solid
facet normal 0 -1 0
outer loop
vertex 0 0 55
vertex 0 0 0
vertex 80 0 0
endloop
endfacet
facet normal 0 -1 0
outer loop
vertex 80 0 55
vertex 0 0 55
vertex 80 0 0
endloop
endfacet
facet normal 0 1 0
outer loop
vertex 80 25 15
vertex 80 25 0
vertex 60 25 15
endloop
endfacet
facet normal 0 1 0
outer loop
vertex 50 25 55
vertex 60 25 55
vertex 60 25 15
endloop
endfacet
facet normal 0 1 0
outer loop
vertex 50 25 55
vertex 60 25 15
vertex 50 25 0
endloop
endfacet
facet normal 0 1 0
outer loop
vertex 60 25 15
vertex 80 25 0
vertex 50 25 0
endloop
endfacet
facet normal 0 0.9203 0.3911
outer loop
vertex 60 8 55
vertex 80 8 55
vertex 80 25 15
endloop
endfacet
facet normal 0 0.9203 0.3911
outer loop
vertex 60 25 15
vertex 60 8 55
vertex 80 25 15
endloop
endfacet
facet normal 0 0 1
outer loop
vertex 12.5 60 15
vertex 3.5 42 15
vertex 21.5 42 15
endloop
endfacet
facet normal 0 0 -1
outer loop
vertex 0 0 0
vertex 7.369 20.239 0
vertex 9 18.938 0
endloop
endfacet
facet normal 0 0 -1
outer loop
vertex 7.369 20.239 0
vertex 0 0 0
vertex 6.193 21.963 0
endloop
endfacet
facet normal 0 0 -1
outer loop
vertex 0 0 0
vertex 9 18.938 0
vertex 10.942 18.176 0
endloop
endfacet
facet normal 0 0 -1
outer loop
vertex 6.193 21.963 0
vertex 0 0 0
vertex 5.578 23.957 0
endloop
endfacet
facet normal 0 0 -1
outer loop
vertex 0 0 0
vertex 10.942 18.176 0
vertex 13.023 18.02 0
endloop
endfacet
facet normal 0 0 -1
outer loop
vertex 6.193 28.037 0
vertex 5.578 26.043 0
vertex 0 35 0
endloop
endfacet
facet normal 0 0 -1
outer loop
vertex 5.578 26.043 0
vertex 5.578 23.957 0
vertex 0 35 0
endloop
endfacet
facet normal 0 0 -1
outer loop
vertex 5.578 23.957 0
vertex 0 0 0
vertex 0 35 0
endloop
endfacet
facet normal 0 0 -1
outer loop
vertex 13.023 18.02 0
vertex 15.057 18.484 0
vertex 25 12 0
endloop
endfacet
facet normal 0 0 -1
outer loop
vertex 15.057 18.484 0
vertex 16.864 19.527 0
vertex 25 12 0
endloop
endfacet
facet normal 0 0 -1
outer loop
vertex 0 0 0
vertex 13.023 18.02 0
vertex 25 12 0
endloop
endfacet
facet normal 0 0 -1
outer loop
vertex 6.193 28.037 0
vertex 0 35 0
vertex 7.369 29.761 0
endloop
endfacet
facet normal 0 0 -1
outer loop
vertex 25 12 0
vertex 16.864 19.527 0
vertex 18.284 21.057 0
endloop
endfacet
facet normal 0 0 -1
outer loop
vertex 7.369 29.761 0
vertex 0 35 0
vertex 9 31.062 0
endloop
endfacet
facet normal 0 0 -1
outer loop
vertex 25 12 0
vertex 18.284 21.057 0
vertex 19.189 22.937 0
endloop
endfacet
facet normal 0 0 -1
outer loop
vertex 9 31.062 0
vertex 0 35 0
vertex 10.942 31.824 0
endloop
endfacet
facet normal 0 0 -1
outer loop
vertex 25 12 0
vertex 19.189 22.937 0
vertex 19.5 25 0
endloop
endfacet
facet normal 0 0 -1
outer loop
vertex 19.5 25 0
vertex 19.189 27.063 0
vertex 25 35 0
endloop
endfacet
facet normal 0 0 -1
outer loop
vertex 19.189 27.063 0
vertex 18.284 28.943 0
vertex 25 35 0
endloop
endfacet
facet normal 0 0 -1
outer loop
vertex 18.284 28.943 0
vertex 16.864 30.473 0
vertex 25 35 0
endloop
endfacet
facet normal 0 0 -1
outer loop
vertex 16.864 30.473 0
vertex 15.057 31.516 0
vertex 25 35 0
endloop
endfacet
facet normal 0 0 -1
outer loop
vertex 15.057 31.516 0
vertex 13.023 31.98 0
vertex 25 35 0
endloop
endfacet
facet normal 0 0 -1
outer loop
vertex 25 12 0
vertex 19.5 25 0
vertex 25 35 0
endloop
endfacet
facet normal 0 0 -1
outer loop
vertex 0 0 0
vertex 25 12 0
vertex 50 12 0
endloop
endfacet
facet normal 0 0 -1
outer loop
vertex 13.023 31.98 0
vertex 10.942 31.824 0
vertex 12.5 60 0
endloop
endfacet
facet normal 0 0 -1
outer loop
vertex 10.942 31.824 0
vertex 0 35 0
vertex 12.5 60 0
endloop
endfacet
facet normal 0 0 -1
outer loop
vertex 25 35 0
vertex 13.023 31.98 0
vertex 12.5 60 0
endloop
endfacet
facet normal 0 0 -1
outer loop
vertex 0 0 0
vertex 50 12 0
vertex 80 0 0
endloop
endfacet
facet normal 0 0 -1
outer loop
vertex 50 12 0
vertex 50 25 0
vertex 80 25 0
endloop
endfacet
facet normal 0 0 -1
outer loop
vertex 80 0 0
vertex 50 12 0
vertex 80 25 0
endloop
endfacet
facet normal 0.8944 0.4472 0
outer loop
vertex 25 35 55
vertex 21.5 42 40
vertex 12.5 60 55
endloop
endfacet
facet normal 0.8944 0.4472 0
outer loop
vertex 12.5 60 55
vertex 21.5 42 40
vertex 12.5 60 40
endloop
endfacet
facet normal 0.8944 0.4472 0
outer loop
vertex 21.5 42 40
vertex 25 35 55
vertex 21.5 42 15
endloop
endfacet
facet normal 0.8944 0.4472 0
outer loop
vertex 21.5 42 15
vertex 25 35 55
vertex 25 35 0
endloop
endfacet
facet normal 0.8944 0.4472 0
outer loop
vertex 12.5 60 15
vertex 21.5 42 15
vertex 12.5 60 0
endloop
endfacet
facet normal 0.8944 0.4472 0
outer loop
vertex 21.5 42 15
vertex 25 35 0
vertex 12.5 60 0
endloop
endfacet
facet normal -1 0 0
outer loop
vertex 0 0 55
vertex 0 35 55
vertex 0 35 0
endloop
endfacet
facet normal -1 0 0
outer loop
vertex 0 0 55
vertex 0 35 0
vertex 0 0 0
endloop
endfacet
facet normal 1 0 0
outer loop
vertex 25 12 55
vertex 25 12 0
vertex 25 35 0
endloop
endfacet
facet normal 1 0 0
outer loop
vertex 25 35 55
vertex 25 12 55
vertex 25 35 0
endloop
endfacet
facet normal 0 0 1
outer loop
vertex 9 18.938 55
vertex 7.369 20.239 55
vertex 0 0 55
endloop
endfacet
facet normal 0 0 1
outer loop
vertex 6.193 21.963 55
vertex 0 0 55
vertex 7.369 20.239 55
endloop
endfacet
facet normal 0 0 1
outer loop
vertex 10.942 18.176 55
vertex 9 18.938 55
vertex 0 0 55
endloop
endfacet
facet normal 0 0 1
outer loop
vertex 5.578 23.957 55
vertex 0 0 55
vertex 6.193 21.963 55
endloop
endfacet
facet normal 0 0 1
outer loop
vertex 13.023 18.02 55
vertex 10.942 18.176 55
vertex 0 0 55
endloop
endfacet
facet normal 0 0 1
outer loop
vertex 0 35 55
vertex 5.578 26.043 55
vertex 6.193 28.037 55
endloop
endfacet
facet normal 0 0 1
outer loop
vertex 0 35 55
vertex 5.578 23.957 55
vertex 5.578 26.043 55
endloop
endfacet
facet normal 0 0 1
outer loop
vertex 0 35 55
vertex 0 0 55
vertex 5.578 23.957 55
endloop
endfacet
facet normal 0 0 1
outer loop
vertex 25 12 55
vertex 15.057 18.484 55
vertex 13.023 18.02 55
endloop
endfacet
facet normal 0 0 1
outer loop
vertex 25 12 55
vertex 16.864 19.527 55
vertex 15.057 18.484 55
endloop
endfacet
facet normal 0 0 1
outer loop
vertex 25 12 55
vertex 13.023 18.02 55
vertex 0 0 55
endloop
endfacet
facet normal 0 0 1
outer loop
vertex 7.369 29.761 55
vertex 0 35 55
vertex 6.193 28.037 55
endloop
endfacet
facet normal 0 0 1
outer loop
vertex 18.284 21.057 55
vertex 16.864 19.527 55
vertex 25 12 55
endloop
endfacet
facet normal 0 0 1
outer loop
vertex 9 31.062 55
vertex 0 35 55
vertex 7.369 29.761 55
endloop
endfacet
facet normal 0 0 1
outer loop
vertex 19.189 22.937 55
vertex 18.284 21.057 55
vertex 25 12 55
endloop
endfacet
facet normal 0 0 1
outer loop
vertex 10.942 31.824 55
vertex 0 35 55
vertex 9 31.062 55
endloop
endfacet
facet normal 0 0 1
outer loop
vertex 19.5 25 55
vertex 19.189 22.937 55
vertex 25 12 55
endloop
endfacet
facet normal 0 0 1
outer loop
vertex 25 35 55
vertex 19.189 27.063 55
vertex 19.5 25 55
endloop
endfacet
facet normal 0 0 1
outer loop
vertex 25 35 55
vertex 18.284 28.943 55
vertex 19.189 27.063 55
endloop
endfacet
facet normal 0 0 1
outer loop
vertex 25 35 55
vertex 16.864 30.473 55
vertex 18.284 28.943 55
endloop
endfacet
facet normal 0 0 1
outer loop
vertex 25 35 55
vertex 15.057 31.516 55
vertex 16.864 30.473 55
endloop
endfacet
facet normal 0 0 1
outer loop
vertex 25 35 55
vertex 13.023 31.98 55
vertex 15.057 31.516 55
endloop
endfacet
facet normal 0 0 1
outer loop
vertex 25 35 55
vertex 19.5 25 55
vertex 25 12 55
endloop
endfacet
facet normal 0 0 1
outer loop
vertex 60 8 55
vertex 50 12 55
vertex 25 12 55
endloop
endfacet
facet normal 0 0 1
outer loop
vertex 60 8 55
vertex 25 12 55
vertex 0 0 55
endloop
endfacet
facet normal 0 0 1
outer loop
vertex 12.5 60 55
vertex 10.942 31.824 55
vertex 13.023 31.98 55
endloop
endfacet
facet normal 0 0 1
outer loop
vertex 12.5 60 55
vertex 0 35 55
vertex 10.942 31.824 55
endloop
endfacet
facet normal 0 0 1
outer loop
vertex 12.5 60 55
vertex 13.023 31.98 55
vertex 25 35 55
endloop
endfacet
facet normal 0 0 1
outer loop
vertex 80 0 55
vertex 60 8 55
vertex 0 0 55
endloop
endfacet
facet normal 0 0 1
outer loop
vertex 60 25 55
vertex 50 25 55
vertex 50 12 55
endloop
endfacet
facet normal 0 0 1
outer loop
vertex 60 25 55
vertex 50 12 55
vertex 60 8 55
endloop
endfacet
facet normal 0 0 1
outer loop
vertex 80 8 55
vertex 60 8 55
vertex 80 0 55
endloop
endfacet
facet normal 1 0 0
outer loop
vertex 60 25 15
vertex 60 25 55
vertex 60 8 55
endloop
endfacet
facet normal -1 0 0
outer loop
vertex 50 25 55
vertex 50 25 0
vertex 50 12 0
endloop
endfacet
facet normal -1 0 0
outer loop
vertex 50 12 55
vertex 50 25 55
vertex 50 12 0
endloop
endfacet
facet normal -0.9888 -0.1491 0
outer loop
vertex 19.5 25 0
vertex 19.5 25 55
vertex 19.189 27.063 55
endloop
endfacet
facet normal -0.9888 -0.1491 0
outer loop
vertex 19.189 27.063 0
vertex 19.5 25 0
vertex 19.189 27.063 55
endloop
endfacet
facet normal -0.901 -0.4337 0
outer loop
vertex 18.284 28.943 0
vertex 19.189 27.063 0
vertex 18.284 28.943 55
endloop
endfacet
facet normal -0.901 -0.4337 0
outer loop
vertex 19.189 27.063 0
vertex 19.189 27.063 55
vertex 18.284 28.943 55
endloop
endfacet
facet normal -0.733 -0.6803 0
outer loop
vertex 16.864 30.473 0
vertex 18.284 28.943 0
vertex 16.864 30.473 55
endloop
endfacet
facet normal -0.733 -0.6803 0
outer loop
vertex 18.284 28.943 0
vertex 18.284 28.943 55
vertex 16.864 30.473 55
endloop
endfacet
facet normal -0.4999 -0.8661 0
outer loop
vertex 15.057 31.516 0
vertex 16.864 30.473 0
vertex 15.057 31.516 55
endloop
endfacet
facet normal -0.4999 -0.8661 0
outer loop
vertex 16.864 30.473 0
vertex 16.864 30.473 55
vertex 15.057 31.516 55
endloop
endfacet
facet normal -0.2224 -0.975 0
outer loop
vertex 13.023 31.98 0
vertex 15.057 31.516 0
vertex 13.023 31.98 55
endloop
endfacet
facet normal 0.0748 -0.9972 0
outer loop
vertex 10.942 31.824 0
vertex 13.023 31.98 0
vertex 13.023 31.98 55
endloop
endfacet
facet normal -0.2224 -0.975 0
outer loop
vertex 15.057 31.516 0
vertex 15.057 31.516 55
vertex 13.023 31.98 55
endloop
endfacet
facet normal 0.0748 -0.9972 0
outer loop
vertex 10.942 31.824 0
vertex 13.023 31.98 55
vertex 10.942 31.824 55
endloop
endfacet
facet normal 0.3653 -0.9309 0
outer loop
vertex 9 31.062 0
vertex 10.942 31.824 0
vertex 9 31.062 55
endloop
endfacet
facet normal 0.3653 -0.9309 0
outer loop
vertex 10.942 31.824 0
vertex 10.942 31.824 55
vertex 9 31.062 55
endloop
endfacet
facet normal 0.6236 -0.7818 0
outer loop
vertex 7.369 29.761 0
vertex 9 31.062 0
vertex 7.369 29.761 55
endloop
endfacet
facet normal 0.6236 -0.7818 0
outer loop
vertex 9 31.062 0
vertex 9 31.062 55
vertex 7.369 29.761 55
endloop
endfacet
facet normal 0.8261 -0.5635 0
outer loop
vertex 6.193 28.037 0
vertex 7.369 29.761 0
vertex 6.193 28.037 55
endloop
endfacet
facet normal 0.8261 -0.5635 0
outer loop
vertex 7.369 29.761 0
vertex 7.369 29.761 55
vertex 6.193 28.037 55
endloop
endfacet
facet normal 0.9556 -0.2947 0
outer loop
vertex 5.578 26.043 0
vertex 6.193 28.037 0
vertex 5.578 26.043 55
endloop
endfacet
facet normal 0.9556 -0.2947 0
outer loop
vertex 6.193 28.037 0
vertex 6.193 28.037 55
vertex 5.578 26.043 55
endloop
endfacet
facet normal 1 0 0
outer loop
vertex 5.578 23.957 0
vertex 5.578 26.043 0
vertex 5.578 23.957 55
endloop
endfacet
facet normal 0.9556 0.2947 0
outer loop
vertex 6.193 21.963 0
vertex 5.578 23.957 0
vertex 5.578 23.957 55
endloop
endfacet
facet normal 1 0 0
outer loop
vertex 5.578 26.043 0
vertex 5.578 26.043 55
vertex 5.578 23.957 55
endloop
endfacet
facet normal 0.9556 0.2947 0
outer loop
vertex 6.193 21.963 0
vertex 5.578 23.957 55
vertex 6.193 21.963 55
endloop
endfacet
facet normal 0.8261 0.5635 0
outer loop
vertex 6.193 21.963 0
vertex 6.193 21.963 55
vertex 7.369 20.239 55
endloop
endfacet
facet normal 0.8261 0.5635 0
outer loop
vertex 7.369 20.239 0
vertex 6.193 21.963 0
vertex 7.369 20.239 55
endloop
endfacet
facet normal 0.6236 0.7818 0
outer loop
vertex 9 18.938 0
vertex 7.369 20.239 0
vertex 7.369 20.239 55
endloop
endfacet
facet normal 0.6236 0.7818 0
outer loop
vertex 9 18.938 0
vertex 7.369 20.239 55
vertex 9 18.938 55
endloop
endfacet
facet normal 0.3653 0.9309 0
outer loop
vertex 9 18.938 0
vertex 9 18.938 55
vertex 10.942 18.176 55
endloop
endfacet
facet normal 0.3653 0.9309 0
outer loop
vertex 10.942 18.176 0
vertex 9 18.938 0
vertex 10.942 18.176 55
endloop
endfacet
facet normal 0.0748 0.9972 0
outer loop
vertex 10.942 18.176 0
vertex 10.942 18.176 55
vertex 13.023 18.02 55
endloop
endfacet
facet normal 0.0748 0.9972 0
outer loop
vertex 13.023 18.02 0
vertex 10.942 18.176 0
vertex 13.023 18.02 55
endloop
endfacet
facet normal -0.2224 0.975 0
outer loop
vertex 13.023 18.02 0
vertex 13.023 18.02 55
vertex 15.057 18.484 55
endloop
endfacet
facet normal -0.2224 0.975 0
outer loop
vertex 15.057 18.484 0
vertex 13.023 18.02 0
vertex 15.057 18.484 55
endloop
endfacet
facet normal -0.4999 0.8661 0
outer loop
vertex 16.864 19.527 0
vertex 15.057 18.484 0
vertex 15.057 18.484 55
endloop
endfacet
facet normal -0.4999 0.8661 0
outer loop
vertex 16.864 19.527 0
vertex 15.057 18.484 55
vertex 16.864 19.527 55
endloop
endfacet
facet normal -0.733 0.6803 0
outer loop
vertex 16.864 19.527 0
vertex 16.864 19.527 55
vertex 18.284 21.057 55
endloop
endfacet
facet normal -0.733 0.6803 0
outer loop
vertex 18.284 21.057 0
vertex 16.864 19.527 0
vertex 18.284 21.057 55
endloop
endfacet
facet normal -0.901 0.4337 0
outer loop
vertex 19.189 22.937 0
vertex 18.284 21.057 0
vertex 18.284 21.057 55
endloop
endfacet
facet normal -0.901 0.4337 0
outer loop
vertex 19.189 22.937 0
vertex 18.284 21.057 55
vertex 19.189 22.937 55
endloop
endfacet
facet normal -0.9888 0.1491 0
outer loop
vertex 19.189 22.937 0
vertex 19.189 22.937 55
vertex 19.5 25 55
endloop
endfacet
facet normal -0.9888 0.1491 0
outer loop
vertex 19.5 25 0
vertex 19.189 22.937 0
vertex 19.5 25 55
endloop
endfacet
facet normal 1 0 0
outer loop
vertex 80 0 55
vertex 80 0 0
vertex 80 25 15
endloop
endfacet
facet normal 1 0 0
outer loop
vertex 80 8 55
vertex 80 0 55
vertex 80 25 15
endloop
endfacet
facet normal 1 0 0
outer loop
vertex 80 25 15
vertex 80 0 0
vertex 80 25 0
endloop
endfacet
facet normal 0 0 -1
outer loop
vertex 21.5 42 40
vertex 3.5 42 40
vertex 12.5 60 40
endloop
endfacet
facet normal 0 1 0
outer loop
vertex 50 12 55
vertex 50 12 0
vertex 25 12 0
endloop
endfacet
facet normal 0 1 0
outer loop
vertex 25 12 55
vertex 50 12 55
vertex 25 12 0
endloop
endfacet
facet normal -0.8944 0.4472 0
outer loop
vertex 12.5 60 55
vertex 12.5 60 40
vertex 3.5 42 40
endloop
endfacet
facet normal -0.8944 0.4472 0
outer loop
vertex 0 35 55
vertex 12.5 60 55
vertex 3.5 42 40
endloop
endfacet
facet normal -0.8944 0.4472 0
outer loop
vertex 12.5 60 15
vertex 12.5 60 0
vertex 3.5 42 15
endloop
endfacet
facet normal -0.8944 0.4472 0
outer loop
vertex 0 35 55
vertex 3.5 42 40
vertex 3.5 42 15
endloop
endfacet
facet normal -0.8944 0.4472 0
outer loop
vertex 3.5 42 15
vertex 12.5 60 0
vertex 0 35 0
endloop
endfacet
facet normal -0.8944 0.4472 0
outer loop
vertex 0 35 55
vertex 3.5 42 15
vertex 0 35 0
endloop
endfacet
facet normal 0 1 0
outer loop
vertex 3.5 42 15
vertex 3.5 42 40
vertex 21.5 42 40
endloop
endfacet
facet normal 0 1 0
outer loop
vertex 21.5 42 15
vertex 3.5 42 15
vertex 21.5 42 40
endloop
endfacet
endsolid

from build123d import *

# Parameters (mm, degrees)
BOSS_EXTRUDE2_DEPTH = 55
SKETCH8_R           = 7
CUT_EXTRUDE2_DEPTH  = 56
CUT_EXTRUDE3_DEPTH  = 25
CUT_EXTRUDE4_DEPTH  = 20


with BuildPart() as part:
    # Sketch7 → Boss-Extrude2 (new body)
    with BuildSketch(Plane.XY):
        Polygon((0, 0), (80, 0), (80, 25), (50, 25), (50, 12), (25, 12), (25, 35), (12.5, 60), (0, 35), align=None)
    extrude(amount=BOSS_EXTRUDE2_DEPTH)

    # Sketch8 → Cut-Extrude2 (cut, through all)
    with BuildSketch(Plane.XY.offset(55)):
        with Locations((12.5, 25)):
            Circle(SKETCH8_R)
    extrude(amount=-CUT_EXTRUDE2_DEPTH, mode=Mode.SUBTRACT)

    # Sketch10 → Cut-Extrude3 (cut)
    with BuildSketch(Plane.XY.offset(40)):
        Polygon((3.5, 42), (21.5, 42), (12.5, 60), align=None)
    extrude(amount=-CUT_EXTRUDE3_DEPTH, mode=Mode.SUBTRACT)

    # Sketch11 → Cut-Extrude4 (cut)
    with BuildSketch(Plane(origin=(80, 0, 0), x_dir=(0, 0, -1), z_dir=(1, 0, 0))):
        Polygon((-55, 8), (-15, 25), (-55, 25), align=None)
    extrude(amount=-CUT_EXTRUDE4_DEPTH, mode=Mode.SUBTRACT)


solid = part.part
